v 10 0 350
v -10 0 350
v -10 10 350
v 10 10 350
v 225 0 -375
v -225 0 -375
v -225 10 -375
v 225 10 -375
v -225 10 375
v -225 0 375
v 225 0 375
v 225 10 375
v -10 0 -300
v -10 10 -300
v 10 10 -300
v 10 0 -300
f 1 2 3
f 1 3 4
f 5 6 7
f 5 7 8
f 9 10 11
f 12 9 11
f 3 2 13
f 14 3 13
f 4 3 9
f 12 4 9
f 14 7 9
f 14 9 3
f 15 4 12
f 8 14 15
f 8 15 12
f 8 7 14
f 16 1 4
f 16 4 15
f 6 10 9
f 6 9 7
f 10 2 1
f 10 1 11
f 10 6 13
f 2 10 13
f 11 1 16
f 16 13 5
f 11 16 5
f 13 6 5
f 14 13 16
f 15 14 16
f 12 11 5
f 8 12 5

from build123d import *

# Parameters (mm, degrees)
SKETCH_1_W      = 450
SKETCH_1_H      = 750
SKETCH_1_W_2    = 20
SKETCH_1_H_2    = 650
EXTRUDE_1_DEPTH = 10


with BuildPart() as part:
    # Эскиз1 → Бобышка-Вытянуть1 (new body)
    with BuildSketch(Plane(origin=(0, 0, 0), x_dir=(1, 0, 0), z_dir=(0, 1, 0))):
        Rectangle(SKETCH_1_W, SKETCH_1_H)
        with Locations((0, -25)):
            Rectangle(SKETCH_1_W_2, SKETCH_1_H_2, mode=Mode.SUBTRACT)
    extrude(amount=EXTRUDE_1_DEPTH)


solid = part.part
